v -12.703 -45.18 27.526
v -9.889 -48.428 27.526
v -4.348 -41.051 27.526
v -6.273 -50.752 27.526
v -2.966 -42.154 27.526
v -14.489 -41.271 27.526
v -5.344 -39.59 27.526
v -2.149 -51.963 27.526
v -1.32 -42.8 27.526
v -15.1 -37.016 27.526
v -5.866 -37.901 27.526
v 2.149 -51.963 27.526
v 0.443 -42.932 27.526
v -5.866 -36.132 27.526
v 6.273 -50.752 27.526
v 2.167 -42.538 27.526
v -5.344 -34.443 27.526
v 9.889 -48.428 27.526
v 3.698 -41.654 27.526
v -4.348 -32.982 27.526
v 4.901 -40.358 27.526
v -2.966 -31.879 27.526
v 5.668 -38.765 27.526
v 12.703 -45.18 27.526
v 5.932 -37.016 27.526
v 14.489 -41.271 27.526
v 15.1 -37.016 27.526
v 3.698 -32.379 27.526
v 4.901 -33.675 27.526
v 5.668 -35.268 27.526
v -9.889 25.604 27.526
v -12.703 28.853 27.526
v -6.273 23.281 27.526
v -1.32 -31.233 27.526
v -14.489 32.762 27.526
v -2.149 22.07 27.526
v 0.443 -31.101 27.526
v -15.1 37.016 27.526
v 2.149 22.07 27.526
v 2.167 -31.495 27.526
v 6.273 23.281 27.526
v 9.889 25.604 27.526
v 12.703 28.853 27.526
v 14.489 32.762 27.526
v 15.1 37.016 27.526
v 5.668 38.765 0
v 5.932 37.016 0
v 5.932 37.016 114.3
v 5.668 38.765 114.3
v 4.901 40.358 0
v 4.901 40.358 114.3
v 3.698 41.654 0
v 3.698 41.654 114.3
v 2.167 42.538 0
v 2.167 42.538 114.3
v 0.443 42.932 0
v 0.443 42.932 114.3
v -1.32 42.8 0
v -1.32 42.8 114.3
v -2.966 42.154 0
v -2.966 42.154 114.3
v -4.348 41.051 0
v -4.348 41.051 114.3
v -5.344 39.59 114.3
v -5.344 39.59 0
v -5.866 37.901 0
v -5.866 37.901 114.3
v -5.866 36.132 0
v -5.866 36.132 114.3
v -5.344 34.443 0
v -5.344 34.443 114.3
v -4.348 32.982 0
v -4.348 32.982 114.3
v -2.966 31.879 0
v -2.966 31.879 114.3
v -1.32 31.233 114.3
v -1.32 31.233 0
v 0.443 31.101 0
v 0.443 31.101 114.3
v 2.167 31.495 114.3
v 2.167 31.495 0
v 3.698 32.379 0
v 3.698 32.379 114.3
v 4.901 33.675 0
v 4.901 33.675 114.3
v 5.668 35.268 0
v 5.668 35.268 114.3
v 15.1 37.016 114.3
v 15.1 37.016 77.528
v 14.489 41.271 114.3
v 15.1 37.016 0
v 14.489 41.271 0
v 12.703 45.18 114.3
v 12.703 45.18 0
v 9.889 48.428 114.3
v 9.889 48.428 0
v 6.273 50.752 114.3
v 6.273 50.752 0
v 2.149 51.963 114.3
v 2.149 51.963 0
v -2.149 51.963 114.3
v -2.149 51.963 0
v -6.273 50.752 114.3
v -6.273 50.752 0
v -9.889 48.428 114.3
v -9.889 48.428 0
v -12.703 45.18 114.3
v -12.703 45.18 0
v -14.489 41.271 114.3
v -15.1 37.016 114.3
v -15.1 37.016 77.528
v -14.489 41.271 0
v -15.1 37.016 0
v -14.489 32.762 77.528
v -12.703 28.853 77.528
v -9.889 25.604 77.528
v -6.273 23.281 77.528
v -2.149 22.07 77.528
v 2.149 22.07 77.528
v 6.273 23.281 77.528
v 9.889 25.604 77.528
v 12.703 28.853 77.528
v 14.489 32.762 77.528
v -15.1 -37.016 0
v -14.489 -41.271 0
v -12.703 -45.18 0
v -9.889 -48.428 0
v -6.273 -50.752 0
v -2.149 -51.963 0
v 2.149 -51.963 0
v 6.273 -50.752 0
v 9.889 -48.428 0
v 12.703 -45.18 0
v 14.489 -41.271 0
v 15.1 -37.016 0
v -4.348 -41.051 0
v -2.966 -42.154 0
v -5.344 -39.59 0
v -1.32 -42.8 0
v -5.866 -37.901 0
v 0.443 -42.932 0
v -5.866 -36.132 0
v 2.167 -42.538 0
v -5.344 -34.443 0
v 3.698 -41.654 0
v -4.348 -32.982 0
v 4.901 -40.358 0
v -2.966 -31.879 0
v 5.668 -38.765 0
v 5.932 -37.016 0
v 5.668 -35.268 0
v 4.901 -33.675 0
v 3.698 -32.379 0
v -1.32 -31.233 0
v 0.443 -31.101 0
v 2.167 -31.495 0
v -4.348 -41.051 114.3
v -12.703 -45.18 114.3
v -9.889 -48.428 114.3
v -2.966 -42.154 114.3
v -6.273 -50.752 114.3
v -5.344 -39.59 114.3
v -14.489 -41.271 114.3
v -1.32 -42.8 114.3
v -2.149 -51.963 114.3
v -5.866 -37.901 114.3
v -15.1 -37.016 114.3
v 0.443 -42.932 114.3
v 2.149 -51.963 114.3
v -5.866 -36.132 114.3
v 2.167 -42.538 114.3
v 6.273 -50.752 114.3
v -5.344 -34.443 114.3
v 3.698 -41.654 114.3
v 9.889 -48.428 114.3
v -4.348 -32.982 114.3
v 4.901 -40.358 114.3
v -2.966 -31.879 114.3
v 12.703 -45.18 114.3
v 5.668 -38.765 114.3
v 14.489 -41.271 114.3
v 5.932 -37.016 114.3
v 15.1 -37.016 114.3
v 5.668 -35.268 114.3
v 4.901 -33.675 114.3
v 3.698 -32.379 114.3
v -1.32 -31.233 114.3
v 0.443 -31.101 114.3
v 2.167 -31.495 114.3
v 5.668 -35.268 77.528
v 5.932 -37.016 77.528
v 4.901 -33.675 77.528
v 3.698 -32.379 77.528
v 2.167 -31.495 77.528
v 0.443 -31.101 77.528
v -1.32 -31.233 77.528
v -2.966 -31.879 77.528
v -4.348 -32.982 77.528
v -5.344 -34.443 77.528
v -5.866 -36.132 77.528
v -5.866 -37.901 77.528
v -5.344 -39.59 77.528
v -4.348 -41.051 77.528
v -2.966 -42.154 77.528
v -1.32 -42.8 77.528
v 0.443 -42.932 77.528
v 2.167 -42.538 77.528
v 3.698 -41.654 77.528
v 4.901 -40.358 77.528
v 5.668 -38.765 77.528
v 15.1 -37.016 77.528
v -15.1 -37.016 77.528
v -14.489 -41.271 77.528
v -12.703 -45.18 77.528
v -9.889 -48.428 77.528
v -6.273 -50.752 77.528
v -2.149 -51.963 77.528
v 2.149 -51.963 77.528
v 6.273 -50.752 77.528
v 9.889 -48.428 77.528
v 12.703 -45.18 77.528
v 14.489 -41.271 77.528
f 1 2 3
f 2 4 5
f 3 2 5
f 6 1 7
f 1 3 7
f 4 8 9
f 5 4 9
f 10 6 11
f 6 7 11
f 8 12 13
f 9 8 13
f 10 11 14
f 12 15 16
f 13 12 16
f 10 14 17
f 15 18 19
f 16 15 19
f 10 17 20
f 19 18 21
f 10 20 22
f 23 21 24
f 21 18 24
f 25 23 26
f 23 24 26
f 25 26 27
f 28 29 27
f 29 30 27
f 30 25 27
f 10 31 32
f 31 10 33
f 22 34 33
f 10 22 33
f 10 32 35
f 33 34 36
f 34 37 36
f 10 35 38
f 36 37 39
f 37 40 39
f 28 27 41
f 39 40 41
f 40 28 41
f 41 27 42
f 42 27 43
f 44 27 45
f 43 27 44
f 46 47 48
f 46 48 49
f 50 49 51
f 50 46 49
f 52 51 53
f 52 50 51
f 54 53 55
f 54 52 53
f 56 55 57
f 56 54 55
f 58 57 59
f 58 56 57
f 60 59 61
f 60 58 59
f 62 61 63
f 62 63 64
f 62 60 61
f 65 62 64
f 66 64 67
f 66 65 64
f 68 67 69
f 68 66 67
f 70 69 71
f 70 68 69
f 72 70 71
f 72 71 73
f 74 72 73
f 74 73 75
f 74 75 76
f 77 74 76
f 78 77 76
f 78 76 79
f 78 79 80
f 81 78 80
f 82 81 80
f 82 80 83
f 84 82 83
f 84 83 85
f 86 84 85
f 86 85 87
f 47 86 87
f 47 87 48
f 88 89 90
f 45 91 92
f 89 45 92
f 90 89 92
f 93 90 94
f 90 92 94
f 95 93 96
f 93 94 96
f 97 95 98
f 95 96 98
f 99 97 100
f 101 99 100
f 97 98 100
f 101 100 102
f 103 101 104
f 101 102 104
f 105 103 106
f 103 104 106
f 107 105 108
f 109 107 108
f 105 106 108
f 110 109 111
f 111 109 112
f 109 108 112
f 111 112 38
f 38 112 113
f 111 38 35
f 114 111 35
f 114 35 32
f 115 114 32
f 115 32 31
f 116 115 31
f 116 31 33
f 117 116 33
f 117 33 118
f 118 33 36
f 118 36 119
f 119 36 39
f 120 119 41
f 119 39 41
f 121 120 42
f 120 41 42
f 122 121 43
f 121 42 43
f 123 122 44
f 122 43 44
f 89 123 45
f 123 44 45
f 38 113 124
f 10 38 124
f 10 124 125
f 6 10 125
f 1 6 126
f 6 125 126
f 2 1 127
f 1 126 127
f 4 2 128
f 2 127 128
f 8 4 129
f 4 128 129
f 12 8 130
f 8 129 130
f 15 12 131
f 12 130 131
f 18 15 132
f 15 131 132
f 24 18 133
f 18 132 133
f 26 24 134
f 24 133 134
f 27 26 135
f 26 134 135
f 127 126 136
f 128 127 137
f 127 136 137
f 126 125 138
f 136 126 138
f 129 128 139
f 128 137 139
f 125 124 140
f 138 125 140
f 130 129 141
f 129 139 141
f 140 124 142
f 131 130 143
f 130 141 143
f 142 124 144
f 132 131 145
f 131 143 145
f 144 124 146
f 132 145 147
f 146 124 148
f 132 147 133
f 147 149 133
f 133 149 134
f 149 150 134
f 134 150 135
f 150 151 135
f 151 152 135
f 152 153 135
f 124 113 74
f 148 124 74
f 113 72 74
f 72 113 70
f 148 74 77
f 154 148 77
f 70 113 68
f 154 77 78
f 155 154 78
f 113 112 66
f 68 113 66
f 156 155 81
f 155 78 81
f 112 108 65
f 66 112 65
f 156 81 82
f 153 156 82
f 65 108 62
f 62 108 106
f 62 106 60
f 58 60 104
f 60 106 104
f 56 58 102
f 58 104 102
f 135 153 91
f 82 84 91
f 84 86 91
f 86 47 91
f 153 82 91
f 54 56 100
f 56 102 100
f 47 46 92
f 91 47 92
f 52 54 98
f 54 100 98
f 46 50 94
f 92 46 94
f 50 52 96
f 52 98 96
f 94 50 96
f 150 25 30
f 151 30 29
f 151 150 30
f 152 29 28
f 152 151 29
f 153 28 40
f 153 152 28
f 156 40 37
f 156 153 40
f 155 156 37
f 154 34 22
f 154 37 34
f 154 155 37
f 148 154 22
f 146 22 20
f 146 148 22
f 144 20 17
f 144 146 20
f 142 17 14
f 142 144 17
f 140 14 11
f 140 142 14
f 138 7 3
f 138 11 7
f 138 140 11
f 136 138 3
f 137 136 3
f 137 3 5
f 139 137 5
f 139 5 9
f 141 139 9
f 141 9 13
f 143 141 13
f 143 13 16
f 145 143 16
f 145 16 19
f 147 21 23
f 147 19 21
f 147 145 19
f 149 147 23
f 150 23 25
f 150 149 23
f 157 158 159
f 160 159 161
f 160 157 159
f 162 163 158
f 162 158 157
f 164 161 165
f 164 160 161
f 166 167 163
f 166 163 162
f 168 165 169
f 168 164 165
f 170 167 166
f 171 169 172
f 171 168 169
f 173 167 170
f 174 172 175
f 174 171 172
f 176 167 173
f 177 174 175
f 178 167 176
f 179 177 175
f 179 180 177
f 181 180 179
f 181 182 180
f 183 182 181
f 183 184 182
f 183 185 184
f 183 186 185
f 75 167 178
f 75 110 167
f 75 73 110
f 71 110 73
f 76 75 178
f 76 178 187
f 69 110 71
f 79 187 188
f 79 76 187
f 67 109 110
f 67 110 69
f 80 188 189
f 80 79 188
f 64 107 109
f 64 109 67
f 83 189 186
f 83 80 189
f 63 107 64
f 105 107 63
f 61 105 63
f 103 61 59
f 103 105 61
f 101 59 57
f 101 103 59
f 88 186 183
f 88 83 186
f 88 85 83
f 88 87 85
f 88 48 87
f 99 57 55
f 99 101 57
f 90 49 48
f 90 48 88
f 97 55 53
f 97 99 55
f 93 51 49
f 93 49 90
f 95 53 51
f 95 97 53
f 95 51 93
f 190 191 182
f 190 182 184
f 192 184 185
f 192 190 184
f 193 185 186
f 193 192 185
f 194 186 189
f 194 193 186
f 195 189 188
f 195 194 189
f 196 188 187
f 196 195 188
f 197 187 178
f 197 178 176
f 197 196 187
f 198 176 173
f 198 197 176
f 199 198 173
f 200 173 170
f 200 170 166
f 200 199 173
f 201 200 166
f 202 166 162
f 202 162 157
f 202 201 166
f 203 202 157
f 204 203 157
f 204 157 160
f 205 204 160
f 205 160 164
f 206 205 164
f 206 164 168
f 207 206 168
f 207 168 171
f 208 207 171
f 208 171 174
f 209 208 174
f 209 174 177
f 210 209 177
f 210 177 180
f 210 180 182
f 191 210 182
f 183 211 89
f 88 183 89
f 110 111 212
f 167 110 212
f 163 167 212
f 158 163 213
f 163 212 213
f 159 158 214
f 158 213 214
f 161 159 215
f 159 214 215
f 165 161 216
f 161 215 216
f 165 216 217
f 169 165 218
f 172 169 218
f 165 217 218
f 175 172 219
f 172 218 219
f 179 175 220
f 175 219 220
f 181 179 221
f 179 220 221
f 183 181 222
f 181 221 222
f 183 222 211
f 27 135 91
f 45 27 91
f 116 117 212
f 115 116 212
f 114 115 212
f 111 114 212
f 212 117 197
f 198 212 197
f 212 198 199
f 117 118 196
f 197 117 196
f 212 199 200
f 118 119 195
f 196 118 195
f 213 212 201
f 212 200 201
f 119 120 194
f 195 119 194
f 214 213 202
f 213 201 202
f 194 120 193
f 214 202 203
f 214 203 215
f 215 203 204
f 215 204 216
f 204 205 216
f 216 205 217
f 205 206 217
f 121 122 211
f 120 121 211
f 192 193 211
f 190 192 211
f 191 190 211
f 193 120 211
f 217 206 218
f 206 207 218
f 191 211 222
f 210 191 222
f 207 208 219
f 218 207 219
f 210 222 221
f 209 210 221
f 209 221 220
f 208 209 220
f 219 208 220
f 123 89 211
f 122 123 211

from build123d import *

# Parameters (mm, degrees)
F0_R     = 5.9319111077
F1_DEPTH = 114.3
F2_W     = 74.0328431129
F2_H     = 50.0019490719
F2_W_2   = 18.4651985765
F3_DEPTH = 30.2013677934
F4_DEPTH = 81.026


with BuildPart() as f1:
    # F0 (on Top) → F1 (new body)
    with BuildSketch(Plane.XY):
        with BuildLine():
            Line((15.1001838967, -37.0164215565), (15.1001838967, 37.0164215565))
            ThreePointArc((15.1001838967, 37.0164215565), (0, 21.9162376598), (-15.1001838967, 37.0164215565))
            Line((-15.1001838967, 37.0164215565), (-15.1001838967, -37.0164215565))
            ThreePointArc((-15.1001838967, -37.0164215565), (0, -21.9162376598), (15.1001838967, -37.0164215565))
        make_face()
        with BuildLine():
            ThreePointArc((-15.1001838967, -37.0164215565), (0, -52.1166054532), (15.1001838967, -37.0164215565))
            ThreePointArc((15.1001838967, -37.0164215565), (0, -21.9162376598), (-15.1001838967, -37.0164215565))
        make_face()
        with Locations((0, -37.0164215565)):
            Circle(F0_R, mode=Mode.SUBTRACT)
        with BuildLine():
            ThreePointArc((-15.1001838967, 37.0164215565), (0, 21.9162376598), (15.1001838967, 37.0164215565))
            ThreePointArc((15.1001838967, 37.0164215565), (0, 52.1166054532), (-15.1001838967, 37.0164215565))
        make_face()
        with Locations((0, 37.0164215565)):
            Circle(F0_R, mode=Mode.SUBTRACT)
    extrude(amount=F1_DEPTH)

    # F2 (on face) → F3 (cut, through all)
    with BuildSketch(Plane.YZ.offset(15.1001838967)):
        with Locations((0, 52.5265261531)):
            Rectangle(F2_W, F2_H)
        with Locations((-46.2490208447, 52.5265261531)):
            Rectangle(F2_W_2, F2_H)
        with Locations((46.2490208447, 52.5265261531)):
            Rectangle(F2_W_2, F2_H)
    extrude(amount=-F3_DEPTH, mode=Mode.SUBTRACT)

    # F0 (on Top) → F4 (join)
    with BuildSketch(Plane.XY):
        with BuildLine():
            ThreePointArc((-15.1001838967, 37.0164215565), (0, 21.9162376598), (15.1001838967, 37.0164215565))
            ThreePointArc((15.1001838967, 37.0164215565), (0, 52.1166054532), (-15.1001838967, 37.0164215565))
        make_face()
        with Locations((0, 37.0164215565)):
            Circle(F0_R, mode=Mode.SUBTRACT)
    extrude(amount=F4_DEPTH)


solid = f1.part
